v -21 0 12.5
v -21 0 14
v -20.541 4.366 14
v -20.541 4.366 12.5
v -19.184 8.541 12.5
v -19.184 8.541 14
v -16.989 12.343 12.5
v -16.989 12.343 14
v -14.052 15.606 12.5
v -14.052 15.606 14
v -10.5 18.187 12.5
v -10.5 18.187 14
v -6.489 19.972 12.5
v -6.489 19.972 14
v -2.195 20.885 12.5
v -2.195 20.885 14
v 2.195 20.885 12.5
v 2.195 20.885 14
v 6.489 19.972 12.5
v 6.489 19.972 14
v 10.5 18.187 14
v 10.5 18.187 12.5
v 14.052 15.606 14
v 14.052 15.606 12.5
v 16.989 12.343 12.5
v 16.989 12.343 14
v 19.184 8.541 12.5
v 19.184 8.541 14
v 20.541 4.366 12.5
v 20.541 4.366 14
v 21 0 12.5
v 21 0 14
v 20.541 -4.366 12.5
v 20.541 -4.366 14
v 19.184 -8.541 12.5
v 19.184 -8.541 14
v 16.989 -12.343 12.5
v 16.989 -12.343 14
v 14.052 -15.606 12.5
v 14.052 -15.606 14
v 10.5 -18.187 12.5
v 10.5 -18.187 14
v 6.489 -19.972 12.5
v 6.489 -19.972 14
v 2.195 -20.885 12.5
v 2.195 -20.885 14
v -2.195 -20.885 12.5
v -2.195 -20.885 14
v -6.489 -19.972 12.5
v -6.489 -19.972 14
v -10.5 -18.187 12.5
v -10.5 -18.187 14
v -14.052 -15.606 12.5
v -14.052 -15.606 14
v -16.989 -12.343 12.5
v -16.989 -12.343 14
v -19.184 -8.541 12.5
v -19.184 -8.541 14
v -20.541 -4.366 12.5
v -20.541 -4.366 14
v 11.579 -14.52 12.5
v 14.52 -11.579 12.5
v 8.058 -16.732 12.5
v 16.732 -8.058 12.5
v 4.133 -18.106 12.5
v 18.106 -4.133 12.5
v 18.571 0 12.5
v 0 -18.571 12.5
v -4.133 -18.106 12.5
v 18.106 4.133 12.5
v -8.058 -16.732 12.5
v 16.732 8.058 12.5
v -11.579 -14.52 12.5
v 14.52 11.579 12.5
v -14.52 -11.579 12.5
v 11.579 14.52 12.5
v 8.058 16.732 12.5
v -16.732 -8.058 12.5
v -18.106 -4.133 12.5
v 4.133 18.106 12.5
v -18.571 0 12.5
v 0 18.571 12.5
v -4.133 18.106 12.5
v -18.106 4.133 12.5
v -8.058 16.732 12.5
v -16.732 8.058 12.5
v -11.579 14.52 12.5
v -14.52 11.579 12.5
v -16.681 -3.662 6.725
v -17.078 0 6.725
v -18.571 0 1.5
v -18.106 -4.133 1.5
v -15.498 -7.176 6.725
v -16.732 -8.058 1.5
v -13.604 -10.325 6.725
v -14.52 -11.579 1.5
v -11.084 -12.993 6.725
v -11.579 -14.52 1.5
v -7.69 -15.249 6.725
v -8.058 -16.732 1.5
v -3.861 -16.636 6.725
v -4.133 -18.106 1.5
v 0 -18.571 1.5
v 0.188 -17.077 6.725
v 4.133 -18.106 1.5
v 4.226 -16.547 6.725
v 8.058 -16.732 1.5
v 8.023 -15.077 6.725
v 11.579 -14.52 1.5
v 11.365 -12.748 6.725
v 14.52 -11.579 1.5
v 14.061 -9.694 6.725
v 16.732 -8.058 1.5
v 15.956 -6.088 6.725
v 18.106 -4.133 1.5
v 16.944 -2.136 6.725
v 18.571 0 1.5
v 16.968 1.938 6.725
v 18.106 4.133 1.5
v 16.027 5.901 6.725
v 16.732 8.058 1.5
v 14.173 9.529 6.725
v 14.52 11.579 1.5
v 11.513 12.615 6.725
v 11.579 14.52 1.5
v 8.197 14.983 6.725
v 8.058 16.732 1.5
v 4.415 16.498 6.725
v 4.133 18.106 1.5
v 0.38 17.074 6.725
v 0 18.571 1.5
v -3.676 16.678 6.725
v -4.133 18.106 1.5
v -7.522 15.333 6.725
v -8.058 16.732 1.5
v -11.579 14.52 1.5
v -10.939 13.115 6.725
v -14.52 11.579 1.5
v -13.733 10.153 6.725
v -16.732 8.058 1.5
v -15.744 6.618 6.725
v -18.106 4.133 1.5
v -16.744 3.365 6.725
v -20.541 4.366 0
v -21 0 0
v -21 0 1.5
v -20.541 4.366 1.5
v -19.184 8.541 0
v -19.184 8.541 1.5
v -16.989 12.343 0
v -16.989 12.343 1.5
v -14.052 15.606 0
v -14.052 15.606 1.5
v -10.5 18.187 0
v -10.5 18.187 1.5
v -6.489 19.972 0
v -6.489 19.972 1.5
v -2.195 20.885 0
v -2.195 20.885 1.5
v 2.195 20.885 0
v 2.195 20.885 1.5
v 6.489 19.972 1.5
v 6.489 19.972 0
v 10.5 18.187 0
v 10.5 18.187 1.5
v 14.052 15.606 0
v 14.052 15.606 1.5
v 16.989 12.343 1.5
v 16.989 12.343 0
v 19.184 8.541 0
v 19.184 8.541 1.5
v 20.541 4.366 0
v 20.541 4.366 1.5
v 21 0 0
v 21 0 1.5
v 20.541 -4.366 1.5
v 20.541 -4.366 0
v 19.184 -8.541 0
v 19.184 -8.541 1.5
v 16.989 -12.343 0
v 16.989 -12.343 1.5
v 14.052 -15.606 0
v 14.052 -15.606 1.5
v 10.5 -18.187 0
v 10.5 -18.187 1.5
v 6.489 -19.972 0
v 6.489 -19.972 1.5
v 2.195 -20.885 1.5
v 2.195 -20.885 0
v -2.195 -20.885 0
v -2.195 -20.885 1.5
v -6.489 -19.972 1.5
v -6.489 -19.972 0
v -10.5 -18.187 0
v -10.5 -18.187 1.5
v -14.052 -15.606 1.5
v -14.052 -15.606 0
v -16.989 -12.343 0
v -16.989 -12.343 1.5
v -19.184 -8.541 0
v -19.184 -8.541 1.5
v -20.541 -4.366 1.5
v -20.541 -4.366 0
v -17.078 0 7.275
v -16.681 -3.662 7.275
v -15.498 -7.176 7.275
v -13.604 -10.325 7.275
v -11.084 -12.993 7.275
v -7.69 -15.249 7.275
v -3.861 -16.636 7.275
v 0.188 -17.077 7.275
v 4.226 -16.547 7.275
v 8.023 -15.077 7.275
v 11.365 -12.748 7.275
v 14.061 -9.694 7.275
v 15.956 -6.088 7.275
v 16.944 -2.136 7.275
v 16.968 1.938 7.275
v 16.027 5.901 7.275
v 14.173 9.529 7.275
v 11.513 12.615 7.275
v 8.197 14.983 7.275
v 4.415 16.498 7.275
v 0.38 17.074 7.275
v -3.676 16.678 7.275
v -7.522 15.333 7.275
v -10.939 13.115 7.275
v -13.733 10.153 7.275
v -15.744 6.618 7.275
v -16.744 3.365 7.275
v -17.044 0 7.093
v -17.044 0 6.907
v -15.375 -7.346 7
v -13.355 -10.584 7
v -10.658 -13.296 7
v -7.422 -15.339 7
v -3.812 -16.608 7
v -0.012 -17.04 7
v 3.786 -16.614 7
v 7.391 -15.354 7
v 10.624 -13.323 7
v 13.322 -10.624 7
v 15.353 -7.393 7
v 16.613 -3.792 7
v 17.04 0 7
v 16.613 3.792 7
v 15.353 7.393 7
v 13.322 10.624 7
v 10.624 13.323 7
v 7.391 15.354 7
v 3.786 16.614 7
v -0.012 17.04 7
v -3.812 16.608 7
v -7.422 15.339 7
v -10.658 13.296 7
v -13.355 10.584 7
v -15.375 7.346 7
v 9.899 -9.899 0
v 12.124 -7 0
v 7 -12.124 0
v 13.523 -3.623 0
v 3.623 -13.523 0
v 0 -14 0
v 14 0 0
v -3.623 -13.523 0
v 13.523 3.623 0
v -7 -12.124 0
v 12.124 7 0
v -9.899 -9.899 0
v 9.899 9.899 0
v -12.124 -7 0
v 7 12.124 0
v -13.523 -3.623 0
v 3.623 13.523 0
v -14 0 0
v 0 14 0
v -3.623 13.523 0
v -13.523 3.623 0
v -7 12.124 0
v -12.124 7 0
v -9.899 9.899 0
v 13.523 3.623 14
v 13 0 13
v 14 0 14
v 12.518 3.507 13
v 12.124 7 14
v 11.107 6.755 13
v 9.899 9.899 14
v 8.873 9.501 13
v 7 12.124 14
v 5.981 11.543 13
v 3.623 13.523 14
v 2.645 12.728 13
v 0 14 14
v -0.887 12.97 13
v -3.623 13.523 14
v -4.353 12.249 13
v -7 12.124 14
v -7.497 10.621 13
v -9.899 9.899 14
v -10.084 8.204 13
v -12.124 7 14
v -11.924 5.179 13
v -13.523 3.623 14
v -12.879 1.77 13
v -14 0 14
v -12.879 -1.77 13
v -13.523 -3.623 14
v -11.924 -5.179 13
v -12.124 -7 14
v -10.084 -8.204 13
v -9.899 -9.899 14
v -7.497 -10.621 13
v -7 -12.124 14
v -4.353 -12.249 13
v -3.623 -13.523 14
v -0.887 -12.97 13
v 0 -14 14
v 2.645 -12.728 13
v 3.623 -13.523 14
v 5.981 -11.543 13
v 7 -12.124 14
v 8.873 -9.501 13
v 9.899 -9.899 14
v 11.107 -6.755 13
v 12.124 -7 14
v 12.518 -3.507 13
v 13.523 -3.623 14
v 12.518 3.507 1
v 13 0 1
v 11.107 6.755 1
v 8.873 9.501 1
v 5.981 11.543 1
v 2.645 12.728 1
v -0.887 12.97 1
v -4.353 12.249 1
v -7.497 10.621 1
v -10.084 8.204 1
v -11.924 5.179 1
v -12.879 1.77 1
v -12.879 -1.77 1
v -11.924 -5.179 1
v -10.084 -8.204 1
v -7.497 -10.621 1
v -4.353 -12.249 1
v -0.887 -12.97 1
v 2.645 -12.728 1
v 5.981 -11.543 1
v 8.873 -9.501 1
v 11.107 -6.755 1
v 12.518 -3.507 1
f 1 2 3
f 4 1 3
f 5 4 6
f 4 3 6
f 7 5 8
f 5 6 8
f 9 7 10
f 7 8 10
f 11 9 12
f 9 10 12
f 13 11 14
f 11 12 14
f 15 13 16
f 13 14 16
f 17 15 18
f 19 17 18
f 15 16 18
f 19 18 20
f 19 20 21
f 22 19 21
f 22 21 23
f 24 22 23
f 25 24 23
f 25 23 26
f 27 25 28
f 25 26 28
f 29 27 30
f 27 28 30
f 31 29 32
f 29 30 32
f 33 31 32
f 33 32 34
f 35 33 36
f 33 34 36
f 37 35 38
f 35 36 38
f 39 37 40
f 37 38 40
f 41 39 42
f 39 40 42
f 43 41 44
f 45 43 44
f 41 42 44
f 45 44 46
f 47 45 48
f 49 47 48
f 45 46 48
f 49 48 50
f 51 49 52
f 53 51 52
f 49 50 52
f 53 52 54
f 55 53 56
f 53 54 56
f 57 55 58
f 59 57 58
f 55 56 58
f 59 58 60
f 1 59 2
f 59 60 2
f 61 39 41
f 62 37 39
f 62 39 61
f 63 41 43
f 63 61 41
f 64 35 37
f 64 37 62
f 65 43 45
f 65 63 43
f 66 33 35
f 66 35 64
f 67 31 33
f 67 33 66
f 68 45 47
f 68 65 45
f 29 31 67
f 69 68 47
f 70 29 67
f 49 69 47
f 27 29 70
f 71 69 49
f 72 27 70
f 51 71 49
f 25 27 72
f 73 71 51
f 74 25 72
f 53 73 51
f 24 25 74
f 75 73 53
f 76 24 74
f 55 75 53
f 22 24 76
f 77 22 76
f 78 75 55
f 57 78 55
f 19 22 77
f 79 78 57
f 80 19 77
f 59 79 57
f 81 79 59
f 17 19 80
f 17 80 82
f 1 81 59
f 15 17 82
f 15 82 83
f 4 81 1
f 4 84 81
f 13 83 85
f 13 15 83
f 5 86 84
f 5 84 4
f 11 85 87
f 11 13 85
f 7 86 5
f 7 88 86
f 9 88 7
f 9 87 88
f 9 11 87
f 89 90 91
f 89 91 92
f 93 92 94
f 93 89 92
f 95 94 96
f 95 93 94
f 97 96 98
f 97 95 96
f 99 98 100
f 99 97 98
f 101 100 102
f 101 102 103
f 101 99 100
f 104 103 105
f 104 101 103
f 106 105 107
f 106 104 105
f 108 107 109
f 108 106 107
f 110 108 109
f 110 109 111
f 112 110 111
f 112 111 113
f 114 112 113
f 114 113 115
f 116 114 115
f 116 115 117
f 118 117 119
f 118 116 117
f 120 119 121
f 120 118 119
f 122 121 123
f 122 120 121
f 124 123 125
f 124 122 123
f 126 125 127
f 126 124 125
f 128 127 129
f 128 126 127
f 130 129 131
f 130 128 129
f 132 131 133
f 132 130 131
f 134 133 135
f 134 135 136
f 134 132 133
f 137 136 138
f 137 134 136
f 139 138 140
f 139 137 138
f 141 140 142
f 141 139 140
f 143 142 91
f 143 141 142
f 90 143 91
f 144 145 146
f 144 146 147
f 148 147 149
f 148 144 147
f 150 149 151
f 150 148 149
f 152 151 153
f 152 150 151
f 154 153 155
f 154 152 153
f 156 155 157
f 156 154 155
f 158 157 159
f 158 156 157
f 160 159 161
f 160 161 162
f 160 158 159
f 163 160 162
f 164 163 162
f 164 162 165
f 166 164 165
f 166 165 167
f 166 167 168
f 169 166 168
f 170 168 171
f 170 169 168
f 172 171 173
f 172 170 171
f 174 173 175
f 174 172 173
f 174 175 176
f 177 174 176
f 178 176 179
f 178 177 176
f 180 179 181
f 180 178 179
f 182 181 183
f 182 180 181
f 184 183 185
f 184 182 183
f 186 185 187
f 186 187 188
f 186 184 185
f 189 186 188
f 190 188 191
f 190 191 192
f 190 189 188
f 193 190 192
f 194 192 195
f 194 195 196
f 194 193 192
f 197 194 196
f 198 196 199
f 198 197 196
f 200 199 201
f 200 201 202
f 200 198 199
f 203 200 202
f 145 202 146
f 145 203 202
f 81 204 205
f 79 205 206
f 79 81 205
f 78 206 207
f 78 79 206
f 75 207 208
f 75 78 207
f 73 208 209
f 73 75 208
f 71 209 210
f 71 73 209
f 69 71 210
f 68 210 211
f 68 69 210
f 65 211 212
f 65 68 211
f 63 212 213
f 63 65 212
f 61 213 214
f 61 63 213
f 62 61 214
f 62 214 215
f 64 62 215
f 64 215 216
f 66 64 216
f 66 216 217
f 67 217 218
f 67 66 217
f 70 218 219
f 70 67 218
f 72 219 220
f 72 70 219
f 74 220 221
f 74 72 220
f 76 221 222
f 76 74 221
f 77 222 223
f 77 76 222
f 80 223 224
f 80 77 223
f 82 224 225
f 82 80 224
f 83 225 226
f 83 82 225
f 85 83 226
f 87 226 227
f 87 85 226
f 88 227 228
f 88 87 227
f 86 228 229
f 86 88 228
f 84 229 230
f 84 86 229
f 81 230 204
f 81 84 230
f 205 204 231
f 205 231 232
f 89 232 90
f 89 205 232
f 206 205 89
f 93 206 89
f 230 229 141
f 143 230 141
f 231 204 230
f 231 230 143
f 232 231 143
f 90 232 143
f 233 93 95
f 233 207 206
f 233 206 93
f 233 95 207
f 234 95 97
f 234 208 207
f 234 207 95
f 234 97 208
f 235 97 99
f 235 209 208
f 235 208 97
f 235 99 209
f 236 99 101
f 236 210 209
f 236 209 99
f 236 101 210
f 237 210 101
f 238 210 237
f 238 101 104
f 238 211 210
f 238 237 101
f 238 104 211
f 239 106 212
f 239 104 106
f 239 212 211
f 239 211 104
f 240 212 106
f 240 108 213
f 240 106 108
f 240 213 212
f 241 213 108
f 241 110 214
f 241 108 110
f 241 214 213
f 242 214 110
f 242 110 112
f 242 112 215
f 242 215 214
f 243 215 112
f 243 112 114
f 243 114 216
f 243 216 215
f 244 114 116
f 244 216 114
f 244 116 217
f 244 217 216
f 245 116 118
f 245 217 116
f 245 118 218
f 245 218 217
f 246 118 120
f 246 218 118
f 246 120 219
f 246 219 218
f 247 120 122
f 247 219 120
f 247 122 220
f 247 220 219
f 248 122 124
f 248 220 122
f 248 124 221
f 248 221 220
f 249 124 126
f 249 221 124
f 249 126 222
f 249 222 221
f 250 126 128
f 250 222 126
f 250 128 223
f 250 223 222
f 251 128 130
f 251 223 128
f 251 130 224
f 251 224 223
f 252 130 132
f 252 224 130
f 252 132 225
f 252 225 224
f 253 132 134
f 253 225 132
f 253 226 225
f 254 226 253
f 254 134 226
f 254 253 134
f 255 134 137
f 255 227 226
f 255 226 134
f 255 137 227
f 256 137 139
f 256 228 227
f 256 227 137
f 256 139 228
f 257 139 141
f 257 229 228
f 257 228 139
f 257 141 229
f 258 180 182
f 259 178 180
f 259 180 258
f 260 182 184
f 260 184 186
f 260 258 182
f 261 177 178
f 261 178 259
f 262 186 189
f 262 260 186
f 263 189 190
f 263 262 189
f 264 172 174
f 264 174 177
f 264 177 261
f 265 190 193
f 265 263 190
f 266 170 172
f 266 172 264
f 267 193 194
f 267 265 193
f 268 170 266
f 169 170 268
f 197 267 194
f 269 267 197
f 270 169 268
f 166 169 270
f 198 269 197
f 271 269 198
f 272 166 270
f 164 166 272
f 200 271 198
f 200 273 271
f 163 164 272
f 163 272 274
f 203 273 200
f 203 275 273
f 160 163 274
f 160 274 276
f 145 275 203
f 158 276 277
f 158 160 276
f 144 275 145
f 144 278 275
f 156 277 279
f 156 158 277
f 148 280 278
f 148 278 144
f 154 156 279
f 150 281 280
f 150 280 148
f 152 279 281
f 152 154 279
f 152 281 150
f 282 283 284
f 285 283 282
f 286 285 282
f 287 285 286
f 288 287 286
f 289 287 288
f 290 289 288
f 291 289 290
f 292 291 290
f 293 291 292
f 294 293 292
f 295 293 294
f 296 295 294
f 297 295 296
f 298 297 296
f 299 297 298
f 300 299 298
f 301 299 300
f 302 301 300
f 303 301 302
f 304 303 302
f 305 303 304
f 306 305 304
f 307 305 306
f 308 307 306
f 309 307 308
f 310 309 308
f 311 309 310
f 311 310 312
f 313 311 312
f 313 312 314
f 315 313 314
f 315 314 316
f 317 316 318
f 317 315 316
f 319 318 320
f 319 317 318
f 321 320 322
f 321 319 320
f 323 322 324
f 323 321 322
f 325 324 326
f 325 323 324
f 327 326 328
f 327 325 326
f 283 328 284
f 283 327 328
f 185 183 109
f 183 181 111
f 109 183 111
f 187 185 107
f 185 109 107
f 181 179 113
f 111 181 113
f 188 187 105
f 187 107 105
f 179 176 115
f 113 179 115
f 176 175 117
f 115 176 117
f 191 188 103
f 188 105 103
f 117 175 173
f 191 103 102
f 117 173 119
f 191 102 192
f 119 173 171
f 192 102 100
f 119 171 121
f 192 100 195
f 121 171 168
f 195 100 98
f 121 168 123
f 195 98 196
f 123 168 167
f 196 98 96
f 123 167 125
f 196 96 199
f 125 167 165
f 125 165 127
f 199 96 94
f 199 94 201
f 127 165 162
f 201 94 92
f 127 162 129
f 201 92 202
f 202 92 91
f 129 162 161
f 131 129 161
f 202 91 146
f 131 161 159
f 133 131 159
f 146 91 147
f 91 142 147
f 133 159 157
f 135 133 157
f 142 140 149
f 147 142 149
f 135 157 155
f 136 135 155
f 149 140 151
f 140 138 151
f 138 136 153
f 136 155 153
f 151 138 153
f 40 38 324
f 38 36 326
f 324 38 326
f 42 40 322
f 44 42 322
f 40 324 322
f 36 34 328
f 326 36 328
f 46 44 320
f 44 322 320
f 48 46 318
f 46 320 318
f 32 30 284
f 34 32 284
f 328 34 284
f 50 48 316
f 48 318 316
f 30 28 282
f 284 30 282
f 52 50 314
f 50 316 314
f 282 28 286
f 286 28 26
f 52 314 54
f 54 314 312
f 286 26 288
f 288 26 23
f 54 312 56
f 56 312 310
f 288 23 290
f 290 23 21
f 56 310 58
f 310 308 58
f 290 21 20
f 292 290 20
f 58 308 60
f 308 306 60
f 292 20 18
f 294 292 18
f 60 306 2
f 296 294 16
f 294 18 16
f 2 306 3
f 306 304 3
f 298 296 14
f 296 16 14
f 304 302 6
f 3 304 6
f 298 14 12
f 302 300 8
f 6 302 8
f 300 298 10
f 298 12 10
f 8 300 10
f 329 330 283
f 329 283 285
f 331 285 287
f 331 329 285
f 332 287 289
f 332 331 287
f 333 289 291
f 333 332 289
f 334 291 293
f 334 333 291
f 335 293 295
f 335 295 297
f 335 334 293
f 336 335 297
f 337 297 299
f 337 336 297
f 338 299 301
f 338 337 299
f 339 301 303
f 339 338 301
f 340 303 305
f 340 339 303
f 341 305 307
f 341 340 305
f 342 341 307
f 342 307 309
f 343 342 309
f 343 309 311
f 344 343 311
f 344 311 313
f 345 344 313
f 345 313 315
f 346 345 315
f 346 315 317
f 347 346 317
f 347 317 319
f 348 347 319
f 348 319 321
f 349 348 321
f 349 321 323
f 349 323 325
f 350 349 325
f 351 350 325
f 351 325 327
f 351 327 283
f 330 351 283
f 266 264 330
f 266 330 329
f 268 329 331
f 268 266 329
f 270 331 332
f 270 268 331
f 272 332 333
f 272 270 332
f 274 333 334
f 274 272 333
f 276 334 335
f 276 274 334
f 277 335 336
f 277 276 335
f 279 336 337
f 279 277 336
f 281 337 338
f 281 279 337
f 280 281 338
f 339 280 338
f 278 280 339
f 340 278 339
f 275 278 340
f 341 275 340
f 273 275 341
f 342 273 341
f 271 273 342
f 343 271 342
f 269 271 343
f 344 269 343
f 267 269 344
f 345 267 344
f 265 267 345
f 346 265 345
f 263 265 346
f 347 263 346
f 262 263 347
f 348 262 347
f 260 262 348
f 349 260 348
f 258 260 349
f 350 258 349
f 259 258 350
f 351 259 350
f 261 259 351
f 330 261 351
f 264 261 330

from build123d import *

# Parameters (mm, degrees)
SKETCH1_R           = 19
SKETCH1_R_2         = 13
BOSS_EXTRUDE1_DEPTH = 14
SKETCH3_R           = 21
SKETCH3_R_2         = 13
BOSS_EXTRUDE2_DEPTH = 1.5
FILLET1_R           = 1
CHAMFER2_SIZE       = 1


with BuildPart() as part:
    # Sketch1 → Boss-Extrude1 (new body)
    with BuildSketch(Plane.XY):
        Circle(SKETCH1_R)
        Circle(SKETCH1_R_2, mode=Mode.SUBTRACT)
    extrude(amount=BOSS_EXTRUDE1_DEPTH)

    # Sketch2 → Cut-Revolve1 (revolve, cut)
    with BuildSketch(Plane(origin=(0, 0, 0), x_dir=(1, 0, 0), z_dir=(0, 1, 0))):
        Polygon((-19, 0), (-17, -7), (-19, -14), align=None)
    revolve(axis=Axis((0, 0, 0), (0, 0, 1)), mode=Mode.SUBTRACT)

    # Sketch3 → Boss-Extrude2 (add)
    with BuildSketch(Plane(origin=(0, 0, 0), x_dir=(-1, 0, 0), z_dir=(0, 0, -1))):
        Circle(SKETCH3_R)
        with Locations(Location((0, 0, 0), (0, 0, 180))):
            Circle(SKETCH3_R_2, mode=Mode.SUBTRACT)
    boss_extrude2 = extrude(amount=-BOSS_EXTRUDE2_DEPTH)

    # Mirror1: Boss-Extrude2 across plane
    add(boss_extrude2.mirror(Plane.XY.offset(7)))

    # Fillet1
    fillet1_edges = [part.edges().sort_by_distance(p)[0] for p in [
        (17, 0, 7),
    ]]
    fillet(fillet1_edges, radius=FILLET1_R)

    # Chamfer2
    chamfer2_edges = [part.edges().sort_by_distance(p)[0] for p in [
        (-13, 0, 0),
        (-13, 0, 14),
    ]]
    chamfer(chamfer2_edges, length=CHAMFER2_SIZE)


solid = part.part
